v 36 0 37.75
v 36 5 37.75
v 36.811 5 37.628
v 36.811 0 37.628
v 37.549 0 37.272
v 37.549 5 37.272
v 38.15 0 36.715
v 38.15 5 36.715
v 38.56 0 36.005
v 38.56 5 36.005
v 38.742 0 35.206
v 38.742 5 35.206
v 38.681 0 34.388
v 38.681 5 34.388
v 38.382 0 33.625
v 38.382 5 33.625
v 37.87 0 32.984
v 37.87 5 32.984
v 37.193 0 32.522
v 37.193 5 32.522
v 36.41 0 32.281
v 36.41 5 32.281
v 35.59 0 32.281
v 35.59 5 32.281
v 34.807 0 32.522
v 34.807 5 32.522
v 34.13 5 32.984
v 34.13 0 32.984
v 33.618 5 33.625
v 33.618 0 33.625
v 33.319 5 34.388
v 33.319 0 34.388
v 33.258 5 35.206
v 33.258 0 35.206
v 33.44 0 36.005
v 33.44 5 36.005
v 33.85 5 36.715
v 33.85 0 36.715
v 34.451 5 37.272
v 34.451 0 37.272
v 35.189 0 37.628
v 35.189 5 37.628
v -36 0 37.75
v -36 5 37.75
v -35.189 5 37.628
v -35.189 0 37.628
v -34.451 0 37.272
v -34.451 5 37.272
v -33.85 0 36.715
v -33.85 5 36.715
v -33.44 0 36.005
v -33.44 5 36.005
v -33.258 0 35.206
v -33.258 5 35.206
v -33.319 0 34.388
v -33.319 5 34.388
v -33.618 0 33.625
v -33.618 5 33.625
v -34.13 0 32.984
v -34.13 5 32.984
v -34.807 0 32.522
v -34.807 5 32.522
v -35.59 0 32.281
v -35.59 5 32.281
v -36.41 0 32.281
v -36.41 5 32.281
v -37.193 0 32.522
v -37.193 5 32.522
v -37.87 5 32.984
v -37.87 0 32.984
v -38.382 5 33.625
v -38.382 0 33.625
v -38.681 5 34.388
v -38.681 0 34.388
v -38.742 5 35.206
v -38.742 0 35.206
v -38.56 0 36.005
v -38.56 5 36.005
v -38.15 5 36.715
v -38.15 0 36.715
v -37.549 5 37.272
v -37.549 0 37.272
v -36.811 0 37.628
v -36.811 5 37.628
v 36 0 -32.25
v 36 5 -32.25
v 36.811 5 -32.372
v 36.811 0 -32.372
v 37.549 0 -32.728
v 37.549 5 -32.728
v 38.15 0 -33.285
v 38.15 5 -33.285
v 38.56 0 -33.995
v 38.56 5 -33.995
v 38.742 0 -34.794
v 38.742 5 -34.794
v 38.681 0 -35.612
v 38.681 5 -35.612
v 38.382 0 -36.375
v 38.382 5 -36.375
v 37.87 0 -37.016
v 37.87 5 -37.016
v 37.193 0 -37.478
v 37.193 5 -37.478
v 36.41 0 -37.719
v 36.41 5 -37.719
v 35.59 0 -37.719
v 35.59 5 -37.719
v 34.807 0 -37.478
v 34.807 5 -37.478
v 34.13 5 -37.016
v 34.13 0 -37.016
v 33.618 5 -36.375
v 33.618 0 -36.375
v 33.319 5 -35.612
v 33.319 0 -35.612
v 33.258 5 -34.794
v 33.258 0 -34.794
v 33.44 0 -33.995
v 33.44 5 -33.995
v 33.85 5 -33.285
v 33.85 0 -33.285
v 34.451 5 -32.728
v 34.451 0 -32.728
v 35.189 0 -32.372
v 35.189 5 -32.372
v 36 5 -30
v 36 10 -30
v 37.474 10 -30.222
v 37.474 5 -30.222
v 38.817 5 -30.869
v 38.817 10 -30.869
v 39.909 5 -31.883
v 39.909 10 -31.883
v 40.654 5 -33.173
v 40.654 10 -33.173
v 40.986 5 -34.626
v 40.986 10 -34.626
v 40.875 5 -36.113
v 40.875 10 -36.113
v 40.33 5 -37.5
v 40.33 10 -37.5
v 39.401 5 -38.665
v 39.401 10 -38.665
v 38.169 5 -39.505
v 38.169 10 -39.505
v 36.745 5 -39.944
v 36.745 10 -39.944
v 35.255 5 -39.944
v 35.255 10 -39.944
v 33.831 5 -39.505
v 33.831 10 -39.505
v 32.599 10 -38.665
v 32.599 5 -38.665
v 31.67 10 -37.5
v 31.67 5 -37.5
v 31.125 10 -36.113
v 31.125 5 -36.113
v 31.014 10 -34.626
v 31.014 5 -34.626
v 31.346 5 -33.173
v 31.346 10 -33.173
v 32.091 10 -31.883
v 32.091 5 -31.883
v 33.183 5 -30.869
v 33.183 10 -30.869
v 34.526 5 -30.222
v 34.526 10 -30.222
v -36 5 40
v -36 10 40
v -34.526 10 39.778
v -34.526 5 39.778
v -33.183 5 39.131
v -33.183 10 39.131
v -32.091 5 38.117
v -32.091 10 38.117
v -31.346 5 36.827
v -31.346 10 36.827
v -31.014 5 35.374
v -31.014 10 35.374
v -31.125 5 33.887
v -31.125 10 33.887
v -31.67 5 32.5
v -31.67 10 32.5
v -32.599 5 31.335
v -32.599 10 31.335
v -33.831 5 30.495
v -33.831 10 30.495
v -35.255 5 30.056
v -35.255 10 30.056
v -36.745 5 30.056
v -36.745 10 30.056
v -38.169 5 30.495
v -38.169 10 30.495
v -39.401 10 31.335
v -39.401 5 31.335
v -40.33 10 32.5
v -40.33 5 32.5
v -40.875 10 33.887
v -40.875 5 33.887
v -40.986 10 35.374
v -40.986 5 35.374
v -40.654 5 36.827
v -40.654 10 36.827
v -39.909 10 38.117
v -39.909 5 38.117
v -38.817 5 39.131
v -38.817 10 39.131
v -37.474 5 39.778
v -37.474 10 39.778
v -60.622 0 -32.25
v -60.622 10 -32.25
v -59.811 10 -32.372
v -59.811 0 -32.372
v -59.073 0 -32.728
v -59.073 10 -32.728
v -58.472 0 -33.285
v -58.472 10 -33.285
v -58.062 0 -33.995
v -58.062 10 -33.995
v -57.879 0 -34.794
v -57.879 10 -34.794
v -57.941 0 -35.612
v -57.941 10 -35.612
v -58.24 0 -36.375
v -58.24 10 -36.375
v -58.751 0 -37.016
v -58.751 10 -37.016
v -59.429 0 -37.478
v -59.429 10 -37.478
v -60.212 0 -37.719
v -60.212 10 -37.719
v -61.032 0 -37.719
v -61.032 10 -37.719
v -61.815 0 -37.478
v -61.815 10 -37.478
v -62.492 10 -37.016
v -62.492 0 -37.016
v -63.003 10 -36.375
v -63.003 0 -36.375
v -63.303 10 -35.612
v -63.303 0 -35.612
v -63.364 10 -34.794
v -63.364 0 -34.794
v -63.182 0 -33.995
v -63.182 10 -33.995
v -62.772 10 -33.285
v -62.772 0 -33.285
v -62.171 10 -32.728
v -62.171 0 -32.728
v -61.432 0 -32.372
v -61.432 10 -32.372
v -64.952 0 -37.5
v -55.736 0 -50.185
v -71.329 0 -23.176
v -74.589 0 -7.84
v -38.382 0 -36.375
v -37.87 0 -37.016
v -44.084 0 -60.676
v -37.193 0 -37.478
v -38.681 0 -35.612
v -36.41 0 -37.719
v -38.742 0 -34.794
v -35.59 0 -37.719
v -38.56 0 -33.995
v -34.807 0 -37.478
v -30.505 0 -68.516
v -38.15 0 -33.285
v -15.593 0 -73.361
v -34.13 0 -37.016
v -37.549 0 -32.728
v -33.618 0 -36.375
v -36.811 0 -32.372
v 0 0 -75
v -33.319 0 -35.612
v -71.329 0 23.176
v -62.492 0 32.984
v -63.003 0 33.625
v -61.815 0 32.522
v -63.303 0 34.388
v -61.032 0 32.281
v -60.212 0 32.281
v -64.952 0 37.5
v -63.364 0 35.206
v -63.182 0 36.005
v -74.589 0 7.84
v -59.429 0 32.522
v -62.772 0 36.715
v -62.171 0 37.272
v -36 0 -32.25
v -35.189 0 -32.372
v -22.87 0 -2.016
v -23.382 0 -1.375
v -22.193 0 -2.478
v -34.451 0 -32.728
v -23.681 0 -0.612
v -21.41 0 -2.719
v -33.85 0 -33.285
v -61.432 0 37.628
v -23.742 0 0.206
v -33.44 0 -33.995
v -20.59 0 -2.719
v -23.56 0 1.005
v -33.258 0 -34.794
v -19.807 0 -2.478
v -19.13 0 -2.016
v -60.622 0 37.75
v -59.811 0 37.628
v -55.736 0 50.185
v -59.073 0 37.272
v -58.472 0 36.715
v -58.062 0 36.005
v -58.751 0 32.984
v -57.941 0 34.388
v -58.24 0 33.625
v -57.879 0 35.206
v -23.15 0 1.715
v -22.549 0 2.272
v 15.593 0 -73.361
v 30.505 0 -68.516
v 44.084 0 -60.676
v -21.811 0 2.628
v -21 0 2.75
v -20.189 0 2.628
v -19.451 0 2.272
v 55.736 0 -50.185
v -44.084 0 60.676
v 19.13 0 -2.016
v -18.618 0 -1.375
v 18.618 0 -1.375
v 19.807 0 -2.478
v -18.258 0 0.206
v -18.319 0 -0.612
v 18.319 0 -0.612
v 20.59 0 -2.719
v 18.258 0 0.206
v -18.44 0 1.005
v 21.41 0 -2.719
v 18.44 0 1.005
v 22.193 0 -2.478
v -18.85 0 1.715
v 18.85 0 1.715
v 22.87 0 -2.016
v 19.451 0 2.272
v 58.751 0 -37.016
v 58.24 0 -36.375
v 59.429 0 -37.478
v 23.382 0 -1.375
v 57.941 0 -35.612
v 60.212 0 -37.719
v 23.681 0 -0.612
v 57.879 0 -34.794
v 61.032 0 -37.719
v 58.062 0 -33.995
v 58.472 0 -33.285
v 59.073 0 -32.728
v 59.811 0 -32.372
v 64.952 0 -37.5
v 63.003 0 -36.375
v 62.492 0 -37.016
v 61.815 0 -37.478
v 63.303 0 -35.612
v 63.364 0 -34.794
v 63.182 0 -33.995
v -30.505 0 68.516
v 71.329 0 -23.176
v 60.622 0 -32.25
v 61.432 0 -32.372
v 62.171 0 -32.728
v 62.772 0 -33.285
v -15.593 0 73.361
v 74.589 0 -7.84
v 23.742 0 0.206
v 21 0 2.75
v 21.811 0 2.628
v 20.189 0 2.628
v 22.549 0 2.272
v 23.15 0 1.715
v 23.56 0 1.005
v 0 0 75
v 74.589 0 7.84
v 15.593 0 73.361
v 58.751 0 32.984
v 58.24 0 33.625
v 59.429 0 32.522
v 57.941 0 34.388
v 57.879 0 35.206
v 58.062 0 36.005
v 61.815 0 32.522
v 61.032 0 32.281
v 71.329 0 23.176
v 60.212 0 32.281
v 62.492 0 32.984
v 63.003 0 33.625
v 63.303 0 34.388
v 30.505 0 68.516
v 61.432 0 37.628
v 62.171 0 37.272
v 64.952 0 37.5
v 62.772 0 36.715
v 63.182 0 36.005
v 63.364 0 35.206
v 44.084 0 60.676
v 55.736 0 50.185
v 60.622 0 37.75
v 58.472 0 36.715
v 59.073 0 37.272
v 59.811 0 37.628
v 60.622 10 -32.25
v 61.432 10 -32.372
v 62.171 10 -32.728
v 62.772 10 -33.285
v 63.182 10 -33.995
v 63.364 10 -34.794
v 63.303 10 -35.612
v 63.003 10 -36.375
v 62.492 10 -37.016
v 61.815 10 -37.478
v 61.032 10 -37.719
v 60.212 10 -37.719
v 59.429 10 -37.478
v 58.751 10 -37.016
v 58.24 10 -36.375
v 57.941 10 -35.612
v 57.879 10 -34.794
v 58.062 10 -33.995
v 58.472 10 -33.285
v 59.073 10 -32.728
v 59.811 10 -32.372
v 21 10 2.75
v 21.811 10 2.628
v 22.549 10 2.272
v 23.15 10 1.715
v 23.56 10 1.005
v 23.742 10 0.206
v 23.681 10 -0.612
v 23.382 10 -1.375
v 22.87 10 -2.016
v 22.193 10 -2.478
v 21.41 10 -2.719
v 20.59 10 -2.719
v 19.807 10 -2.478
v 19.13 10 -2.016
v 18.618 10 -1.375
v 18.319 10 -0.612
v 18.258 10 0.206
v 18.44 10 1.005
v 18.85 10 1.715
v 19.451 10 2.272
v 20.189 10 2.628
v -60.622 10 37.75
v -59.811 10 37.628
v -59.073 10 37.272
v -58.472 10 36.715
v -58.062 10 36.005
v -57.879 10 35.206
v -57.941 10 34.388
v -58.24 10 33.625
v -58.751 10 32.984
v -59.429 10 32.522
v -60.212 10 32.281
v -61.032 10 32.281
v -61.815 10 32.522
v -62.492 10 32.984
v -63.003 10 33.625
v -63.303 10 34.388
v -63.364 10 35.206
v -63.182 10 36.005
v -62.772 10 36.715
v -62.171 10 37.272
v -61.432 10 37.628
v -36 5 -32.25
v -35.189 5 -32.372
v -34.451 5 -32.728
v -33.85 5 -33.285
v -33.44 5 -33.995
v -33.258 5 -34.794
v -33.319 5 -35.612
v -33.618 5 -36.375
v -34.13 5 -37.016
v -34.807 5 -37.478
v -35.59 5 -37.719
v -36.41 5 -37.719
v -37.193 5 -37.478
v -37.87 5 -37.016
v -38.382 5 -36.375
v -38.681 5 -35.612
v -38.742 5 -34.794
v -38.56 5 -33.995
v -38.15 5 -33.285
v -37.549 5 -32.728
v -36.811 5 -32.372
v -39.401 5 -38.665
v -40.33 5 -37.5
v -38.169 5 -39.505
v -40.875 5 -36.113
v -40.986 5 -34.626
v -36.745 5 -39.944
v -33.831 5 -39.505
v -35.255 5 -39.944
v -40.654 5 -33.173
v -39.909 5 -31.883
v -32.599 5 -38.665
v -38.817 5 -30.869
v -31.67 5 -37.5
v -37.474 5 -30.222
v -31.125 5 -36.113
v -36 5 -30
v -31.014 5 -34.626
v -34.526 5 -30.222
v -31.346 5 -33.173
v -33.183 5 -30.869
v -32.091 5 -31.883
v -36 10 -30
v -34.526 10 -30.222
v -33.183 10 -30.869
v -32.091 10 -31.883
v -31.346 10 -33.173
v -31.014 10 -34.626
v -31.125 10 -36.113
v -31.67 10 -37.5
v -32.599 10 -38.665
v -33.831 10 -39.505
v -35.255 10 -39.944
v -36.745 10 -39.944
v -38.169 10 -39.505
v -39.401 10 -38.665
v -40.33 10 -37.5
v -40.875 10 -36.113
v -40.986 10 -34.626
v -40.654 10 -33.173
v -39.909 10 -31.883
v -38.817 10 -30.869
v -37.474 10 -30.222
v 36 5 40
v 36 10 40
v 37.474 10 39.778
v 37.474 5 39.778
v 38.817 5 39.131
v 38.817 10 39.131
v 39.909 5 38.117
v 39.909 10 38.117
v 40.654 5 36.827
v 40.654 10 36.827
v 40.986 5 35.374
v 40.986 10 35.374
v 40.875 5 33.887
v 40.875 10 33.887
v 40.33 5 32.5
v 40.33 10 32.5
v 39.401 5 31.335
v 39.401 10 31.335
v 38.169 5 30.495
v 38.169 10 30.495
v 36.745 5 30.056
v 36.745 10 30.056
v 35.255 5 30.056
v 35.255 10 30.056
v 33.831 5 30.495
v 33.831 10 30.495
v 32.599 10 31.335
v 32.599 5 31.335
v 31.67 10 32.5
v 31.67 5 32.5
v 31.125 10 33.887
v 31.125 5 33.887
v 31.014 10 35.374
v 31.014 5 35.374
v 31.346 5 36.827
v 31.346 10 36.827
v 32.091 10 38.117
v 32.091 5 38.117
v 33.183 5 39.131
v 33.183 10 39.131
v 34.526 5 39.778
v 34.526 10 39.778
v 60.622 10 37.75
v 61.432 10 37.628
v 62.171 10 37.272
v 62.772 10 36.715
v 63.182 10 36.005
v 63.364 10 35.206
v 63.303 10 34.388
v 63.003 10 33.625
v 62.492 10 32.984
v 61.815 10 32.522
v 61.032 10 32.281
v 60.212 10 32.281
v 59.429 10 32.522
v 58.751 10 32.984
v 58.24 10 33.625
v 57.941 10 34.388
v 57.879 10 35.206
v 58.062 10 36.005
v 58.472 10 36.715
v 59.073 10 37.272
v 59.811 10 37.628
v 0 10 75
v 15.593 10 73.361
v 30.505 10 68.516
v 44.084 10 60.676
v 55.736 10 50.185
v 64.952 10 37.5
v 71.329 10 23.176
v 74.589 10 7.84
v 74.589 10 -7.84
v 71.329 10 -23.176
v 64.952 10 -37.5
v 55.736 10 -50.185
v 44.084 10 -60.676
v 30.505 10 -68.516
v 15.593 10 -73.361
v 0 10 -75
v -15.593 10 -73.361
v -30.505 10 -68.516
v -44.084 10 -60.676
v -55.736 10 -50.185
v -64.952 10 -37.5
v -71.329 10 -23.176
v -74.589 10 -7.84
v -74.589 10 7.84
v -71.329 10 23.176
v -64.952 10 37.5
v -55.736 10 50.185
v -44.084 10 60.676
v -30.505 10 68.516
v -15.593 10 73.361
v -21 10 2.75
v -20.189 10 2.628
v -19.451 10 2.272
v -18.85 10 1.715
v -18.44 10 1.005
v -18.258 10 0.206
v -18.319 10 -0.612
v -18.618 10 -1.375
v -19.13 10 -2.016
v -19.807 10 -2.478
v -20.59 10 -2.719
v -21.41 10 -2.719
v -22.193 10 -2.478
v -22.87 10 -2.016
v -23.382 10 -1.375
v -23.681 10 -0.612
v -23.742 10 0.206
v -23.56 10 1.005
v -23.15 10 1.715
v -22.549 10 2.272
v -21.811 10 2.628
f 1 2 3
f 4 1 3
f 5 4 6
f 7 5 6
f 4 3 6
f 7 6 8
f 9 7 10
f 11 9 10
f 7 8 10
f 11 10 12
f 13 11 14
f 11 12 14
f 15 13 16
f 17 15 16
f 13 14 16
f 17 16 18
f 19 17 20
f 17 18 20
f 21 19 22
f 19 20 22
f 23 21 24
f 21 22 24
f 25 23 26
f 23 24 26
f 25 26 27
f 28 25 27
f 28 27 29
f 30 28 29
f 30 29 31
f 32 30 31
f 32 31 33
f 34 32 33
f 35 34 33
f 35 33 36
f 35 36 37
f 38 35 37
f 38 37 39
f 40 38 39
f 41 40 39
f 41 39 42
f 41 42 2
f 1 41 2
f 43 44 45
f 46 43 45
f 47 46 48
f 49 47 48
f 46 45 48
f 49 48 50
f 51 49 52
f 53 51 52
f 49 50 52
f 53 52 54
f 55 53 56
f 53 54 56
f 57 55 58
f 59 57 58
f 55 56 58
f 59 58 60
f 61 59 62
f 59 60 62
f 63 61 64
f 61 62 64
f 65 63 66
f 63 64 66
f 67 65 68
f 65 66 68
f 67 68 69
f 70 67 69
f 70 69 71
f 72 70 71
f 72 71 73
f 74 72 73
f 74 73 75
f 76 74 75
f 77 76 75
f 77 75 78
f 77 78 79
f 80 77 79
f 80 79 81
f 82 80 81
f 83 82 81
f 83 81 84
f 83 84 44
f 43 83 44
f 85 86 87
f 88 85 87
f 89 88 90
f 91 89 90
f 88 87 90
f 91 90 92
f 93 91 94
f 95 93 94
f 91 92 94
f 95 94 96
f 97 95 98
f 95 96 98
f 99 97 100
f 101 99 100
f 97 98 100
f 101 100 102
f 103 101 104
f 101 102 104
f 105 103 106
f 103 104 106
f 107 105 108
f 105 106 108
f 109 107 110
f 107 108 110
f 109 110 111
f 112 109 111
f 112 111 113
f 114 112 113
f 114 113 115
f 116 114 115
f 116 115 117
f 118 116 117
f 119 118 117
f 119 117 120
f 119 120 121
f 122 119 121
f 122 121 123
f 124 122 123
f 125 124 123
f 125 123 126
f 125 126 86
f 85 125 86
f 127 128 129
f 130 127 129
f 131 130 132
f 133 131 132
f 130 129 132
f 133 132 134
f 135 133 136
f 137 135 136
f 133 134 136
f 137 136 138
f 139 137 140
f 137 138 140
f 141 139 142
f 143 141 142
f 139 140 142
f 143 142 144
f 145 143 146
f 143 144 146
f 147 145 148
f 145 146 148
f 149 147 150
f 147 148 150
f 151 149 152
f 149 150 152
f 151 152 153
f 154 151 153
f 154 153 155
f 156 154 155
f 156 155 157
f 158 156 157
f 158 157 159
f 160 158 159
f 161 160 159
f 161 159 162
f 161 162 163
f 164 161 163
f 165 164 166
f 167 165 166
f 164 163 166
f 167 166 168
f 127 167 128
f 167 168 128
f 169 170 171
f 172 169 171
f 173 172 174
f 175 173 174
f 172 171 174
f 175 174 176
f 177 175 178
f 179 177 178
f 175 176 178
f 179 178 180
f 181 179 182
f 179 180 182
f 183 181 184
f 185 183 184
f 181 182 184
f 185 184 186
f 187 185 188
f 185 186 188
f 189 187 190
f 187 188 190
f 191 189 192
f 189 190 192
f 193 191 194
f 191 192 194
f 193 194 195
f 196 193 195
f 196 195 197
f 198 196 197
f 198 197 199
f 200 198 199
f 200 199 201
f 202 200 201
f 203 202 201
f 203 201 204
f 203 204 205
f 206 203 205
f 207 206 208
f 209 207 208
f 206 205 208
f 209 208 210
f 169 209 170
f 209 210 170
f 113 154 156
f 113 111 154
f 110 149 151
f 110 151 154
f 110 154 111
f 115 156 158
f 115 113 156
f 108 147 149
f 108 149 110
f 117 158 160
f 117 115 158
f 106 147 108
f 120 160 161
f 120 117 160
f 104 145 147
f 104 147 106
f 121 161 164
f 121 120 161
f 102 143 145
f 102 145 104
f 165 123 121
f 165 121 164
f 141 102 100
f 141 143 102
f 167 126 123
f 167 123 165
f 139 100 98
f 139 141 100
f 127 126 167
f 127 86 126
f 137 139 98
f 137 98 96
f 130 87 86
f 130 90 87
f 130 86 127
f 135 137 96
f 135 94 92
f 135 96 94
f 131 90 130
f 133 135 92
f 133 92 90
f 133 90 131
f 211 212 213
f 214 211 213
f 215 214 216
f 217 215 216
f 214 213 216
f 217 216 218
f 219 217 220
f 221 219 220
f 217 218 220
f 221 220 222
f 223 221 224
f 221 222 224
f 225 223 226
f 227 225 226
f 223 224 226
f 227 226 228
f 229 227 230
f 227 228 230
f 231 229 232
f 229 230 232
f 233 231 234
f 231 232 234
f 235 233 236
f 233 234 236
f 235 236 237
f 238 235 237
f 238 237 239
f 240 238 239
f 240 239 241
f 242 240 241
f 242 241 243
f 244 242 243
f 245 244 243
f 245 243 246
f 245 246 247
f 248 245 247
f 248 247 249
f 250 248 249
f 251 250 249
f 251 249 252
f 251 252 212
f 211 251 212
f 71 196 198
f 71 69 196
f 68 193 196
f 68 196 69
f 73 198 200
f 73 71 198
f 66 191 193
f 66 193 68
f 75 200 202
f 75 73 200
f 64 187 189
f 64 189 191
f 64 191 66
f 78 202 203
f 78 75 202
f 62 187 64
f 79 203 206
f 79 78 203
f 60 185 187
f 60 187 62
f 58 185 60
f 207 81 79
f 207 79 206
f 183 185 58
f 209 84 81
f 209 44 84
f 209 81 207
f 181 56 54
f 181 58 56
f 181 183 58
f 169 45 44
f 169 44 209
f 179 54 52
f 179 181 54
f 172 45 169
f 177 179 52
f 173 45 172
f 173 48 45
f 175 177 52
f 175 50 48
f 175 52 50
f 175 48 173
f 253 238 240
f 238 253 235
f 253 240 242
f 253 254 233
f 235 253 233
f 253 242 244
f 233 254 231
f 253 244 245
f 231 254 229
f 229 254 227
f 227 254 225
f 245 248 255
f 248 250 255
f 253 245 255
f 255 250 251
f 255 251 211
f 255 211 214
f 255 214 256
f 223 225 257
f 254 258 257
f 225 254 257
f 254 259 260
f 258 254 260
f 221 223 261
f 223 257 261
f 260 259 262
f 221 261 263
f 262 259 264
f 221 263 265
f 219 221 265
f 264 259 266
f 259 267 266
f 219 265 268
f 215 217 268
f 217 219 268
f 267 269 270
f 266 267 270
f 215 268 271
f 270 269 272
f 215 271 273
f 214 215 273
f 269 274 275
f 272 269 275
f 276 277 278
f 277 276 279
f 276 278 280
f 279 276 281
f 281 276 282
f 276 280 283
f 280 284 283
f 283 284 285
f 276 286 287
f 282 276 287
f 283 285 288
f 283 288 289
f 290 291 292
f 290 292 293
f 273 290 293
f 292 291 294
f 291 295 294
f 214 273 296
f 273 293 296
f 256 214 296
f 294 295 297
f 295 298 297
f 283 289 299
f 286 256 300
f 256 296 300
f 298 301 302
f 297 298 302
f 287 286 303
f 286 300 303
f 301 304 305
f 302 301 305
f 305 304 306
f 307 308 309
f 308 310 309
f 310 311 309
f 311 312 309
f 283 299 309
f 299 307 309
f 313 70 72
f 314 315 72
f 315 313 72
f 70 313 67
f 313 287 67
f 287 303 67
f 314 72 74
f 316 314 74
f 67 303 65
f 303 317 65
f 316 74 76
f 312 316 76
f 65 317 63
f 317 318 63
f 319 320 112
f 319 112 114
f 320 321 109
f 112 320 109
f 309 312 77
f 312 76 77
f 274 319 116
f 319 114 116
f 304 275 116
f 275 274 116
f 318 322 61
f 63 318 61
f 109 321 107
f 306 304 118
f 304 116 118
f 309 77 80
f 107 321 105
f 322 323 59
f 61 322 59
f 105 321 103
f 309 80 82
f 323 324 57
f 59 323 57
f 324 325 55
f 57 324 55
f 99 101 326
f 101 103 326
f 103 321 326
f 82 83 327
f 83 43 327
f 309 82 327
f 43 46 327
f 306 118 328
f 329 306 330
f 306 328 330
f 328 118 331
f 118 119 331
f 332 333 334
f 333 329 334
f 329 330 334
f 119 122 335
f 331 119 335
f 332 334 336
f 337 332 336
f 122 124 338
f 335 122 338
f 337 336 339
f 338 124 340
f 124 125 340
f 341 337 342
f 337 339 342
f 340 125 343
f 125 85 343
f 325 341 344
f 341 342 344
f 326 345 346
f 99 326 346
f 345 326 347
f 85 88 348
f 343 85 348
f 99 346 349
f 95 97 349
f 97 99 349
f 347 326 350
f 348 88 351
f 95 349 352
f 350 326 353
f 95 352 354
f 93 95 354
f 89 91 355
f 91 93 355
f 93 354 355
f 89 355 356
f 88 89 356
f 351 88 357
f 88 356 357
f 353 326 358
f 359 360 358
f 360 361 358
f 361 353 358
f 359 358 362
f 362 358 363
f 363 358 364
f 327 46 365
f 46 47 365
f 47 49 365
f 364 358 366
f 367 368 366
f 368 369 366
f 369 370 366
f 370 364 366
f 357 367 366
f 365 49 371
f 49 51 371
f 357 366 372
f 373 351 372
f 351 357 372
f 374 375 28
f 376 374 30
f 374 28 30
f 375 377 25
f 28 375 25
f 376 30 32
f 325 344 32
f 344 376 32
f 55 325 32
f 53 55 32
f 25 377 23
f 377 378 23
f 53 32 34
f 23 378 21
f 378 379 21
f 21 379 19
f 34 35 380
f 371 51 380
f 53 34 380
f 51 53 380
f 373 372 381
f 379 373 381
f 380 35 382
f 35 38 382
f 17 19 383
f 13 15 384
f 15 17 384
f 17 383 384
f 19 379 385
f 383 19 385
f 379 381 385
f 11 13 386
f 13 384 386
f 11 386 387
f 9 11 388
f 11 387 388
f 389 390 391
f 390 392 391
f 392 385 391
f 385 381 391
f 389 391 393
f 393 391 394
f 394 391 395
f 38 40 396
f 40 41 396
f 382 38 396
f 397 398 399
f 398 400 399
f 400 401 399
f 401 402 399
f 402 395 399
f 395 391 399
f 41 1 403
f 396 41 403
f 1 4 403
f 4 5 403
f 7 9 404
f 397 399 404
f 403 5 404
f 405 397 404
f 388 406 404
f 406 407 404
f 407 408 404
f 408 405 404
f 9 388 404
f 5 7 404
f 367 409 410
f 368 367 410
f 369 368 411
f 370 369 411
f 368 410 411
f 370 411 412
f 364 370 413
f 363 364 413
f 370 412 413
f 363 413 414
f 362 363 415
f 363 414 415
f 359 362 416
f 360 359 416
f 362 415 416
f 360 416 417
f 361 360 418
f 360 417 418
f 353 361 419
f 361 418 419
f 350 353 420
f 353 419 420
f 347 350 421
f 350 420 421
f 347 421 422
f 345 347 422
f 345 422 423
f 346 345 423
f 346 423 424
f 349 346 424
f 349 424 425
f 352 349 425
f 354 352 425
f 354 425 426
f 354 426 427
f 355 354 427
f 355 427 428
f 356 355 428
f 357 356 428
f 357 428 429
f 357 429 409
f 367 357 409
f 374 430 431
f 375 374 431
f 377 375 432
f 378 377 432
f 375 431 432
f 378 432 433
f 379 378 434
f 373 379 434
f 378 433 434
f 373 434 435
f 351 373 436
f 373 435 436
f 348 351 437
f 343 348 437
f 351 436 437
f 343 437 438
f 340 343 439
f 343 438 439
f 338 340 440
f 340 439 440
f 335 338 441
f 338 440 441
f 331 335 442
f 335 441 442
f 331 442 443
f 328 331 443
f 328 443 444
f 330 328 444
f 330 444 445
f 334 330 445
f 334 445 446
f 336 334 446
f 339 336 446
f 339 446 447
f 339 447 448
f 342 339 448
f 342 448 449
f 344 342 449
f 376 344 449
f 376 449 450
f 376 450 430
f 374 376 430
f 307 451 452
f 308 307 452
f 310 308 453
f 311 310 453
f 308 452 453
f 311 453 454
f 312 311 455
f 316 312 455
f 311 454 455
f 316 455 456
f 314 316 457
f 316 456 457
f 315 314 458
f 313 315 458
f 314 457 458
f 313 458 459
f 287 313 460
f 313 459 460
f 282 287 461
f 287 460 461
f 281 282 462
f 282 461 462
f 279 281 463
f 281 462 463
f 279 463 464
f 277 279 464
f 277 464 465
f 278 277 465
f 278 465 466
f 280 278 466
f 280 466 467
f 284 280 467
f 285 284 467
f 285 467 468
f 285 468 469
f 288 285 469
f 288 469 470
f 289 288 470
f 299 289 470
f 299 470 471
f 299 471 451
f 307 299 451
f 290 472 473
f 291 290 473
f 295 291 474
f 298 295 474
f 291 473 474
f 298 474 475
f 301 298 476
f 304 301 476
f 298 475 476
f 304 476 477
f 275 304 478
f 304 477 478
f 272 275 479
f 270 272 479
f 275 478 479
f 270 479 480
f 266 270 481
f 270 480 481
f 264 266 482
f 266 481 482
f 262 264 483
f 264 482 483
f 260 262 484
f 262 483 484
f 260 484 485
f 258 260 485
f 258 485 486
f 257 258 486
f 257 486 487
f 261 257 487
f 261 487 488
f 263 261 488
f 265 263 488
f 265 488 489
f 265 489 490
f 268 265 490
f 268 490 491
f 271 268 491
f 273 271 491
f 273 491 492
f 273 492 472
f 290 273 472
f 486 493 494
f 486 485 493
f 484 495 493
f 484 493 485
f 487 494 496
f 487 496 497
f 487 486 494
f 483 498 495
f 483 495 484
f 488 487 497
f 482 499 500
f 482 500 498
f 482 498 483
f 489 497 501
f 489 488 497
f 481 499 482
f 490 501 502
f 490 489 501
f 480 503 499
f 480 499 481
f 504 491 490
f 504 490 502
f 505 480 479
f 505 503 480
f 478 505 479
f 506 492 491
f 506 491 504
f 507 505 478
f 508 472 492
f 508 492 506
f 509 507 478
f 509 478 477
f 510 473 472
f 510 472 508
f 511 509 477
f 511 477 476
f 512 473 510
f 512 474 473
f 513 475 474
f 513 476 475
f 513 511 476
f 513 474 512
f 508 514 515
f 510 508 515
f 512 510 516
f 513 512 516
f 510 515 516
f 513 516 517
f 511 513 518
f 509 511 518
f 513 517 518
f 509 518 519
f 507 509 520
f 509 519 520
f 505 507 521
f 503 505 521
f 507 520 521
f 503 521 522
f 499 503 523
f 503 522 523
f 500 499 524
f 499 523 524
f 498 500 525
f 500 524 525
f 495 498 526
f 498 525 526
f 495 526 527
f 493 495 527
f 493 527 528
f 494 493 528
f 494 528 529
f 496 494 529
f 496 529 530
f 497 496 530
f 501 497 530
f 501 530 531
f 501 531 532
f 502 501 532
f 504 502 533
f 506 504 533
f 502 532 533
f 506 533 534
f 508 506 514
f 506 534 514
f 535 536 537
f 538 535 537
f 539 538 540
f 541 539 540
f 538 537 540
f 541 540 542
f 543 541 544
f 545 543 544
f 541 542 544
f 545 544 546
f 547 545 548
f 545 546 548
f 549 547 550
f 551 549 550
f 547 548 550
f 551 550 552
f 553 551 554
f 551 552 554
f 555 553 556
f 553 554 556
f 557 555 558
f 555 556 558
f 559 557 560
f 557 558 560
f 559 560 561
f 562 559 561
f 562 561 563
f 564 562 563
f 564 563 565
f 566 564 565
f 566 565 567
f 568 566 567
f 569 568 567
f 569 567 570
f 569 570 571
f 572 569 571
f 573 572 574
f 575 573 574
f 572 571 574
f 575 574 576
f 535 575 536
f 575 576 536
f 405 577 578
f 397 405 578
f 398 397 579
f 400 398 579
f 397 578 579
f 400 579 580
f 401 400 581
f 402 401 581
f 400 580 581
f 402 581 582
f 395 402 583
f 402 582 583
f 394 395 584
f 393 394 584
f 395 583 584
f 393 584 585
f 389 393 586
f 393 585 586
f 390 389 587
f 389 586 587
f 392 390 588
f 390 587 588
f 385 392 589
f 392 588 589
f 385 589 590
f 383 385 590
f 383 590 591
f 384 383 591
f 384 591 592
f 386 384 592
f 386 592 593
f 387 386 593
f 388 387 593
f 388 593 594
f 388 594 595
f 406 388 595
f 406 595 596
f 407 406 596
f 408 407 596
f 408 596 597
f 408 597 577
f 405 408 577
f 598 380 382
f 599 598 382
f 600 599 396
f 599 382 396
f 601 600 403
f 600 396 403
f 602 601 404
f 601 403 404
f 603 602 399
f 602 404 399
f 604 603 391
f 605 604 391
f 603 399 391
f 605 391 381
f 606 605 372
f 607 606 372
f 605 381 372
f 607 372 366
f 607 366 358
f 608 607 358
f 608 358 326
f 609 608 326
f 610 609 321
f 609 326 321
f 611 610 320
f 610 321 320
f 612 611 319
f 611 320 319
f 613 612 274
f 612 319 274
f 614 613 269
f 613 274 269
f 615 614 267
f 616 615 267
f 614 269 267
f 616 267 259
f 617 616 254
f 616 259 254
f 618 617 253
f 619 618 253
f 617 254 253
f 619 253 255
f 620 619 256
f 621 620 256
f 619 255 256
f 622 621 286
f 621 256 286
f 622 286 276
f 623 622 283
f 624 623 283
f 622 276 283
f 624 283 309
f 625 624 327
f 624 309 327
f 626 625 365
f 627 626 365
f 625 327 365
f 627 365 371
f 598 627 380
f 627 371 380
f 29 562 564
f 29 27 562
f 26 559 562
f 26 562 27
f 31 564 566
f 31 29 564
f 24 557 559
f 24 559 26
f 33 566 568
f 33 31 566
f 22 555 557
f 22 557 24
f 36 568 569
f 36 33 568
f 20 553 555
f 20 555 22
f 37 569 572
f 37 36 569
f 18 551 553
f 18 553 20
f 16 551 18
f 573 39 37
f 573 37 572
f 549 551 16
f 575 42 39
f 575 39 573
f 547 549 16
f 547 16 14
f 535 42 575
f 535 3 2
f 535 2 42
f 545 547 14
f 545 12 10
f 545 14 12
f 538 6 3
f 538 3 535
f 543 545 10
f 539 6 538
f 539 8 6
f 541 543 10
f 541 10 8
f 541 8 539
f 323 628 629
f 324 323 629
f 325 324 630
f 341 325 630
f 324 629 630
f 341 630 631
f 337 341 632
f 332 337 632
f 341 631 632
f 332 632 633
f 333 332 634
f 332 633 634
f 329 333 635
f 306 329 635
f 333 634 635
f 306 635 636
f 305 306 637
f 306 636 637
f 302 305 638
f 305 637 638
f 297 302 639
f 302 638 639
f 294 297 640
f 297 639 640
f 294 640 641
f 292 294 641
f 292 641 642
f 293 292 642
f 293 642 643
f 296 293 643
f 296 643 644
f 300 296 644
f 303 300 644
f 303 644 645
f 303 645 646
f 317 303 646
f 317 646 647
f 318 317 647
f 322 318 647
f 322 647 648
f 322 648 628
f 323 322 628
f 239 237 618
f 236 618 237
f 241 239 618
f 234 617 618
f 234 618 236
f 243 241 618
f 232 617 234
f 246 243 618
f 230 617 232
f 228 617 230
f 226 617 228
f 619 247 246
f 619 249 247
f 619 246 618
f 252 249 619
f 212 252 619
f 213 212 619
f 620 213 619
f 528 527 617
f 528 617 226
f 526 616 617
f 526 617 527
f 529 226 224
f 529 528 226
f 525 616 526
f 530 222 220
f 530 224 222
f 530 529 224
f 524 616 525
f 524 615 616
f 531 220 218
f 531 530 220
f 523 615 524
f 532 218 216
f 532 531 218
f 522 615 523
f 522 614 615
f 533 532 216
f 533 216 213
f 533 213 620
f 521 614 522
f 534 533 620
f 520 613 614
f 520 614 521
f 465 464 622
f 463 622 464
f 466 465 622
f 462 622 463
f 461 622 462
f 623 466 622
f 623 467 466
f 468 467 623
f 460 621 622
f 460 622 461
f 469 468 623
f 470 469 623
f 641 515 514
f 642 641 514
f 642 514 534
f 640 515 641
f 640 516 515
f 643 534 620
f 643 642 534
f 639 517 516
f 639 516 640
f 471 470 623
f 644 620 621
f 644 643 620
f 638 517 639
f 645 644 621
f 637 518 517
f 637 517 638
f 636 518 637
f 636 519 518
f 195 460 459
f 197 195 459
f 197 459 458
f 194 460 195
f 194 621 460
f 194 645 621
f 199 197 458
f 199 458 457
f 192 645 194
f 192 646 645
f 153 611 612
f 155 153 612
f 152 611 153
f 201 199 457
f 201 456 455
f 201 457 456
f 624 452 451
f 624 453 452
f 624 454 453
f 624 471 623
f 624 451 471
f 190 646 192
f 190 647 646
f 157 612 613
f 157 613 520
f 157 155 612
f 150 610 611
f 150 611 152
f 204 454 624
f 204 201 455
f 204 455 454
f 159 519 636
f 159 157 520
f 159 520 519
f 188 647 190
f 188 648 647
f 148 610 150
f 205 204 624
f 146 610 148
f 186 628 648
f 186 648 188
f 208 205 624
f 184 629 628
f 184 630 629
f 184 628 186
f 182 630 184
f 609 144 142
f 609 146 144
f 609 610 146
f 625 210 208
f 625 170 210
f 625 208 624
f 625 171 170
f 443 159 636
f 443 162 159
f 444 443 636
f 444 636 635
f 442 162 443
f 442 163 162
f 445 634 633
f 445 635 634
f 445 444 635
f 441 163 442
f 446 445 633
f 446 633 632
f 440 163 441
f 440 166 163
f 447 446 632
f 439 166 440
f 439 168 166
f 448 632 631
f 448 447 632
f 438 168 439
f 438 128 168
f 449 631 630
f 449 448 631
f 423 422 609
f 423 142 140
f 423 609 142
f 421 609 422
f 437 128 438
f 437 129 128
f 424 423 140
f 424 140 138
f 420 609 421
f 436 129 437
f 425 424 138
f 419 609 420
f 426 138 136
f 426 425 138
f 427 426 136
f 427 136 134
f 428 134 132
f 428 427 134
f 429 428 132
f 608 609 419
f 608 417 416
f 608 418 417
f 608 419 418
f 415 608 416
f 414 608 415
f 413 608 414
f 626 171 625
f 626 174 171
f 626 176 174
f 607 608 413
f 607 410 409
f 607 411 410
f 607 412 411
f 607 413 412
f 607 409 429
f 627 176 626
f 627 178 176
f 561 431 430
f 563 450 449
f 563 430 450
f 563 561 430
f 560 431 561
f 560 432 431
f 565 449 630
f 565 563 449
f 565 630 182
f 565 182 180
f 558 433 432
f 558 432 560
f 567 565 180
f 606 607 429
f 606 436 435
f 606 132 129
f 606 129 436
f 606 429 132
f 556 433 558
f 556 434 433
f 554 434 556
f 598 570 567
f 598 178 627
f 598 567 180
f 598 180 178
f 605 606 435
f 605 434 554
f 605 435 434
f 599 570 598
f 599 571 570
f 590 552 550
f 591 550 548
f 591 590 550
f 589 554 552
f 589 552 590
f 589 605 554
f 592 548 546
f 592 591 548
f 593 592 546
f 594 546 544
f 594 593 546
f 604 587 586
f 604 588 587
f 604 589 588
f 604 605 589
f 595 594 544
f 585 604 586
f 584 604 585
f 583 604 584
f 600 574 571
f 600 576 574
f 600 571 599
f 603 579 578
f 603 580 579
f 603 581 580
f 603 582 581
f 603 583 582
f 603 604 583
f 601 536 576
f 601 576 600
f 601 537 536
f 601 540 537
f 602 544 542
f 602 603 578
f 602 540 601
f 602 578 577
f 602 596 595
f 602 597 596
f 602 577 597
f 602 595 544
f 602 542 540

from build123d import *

# Parameters (mm, degrees)
SKETCH_1_R          = 75
EXTRUDE_1_DEPTH     = 10
SKETCH_2_R          = 2.75
CUT_EXTRUDE_1_DEPTH = 27
SKETCH_3_R          = 5
CUT_EXTRUDE_2_DEPTH = 5


with BuildPart() as part:
    # 草图1 → 凸台-拉伸1 (new body)
    with BuildSketch(Plane(origin=(0, 0, 0), x_dir=(1, 0, 0), z_dir=(0, 1, 0))):
        with Locations(Location((0, 0, 0), (0, 0, 270))):
            Circle(SKETCH_1_R)
    extrude(amount=EXTRUDE_1_DEPTH)

    # 草图2 → 切除-拉伸1 (cut)
    with BuildSketch(Plane(origin=(0, 10, 0), x_dir=(1, 0, 0), z_dir=(0, 1, 0))):
        with Locations(Location((21, 0, 0), (0, 0, 270))):
            Circle(SKETCH_2_R)
        with Locations(Location((-21, 0, 0), (0, 0, 270))):
            Circle(SKETCH_2_R)
        with Locations(Location((36, 35, 0), (0, 0, 270))):
            Circle(SKETCH_2_R)
        with Locations(Location((36, -35, 0), (0, 0, 270))):
            Circle(SKETCH_2_R)
        with Locations(Location((-36, -35, 0), (0, 0, 270))):
            Circle(SKETCH_2_R)
        with Locations(Location((-36, 35, 0), (0, 0, 270))):
            Circle(SKETCH_2_R)
        with Locations(Location((60.621778265, 35, 0), (0, 0, 270))):
            Circle(SKETCH_2_R)
        with Locations(Location((60.621778265, -35, 0), (0, 0, 270))):
            Circle(SKETCH_2_R)
        with Locations(Location((-60.621778265, -35, 0), (0, 0, 270))):
            Circle(SKETCH_2_R)
        with Locations(Location((-60.621778265, 35, 0), (0, 0, 270))):
            Circle(SKETCH_2_R)
    extrude(amount=-CUT_EXTRUDE_1_DEPTH, mode=Mode.SUBTRACT)

    # 草图3 → 切除-拉伸2 (cut)
    with BuildSketch(Plane(origin=(0, 10, 0), x_dir=(1, 0, 0), z_dir=(0, 1, 0))):
        with Locations(Location((36, 35, 0), (0, 0, 270))):
            Circle(SKETCH_3_R)
        with Locations(Location((36, -35, 0), (0, 0, 270))):
            Circle(SKETCH_3_R)
        with Locations(Location((-36, -35, 0), (0, 0, 270))):
            Circle(SKETCH_3_R)
        with Locations(Location((-36, 35, 0), (0, 0, 270))):
            Circle(SKETCH_3_R)
    extrude(amount=-CUT_EXTRUDE_2_DEPTH, mode=Mode.SUBTRACT)


solid = part.part
